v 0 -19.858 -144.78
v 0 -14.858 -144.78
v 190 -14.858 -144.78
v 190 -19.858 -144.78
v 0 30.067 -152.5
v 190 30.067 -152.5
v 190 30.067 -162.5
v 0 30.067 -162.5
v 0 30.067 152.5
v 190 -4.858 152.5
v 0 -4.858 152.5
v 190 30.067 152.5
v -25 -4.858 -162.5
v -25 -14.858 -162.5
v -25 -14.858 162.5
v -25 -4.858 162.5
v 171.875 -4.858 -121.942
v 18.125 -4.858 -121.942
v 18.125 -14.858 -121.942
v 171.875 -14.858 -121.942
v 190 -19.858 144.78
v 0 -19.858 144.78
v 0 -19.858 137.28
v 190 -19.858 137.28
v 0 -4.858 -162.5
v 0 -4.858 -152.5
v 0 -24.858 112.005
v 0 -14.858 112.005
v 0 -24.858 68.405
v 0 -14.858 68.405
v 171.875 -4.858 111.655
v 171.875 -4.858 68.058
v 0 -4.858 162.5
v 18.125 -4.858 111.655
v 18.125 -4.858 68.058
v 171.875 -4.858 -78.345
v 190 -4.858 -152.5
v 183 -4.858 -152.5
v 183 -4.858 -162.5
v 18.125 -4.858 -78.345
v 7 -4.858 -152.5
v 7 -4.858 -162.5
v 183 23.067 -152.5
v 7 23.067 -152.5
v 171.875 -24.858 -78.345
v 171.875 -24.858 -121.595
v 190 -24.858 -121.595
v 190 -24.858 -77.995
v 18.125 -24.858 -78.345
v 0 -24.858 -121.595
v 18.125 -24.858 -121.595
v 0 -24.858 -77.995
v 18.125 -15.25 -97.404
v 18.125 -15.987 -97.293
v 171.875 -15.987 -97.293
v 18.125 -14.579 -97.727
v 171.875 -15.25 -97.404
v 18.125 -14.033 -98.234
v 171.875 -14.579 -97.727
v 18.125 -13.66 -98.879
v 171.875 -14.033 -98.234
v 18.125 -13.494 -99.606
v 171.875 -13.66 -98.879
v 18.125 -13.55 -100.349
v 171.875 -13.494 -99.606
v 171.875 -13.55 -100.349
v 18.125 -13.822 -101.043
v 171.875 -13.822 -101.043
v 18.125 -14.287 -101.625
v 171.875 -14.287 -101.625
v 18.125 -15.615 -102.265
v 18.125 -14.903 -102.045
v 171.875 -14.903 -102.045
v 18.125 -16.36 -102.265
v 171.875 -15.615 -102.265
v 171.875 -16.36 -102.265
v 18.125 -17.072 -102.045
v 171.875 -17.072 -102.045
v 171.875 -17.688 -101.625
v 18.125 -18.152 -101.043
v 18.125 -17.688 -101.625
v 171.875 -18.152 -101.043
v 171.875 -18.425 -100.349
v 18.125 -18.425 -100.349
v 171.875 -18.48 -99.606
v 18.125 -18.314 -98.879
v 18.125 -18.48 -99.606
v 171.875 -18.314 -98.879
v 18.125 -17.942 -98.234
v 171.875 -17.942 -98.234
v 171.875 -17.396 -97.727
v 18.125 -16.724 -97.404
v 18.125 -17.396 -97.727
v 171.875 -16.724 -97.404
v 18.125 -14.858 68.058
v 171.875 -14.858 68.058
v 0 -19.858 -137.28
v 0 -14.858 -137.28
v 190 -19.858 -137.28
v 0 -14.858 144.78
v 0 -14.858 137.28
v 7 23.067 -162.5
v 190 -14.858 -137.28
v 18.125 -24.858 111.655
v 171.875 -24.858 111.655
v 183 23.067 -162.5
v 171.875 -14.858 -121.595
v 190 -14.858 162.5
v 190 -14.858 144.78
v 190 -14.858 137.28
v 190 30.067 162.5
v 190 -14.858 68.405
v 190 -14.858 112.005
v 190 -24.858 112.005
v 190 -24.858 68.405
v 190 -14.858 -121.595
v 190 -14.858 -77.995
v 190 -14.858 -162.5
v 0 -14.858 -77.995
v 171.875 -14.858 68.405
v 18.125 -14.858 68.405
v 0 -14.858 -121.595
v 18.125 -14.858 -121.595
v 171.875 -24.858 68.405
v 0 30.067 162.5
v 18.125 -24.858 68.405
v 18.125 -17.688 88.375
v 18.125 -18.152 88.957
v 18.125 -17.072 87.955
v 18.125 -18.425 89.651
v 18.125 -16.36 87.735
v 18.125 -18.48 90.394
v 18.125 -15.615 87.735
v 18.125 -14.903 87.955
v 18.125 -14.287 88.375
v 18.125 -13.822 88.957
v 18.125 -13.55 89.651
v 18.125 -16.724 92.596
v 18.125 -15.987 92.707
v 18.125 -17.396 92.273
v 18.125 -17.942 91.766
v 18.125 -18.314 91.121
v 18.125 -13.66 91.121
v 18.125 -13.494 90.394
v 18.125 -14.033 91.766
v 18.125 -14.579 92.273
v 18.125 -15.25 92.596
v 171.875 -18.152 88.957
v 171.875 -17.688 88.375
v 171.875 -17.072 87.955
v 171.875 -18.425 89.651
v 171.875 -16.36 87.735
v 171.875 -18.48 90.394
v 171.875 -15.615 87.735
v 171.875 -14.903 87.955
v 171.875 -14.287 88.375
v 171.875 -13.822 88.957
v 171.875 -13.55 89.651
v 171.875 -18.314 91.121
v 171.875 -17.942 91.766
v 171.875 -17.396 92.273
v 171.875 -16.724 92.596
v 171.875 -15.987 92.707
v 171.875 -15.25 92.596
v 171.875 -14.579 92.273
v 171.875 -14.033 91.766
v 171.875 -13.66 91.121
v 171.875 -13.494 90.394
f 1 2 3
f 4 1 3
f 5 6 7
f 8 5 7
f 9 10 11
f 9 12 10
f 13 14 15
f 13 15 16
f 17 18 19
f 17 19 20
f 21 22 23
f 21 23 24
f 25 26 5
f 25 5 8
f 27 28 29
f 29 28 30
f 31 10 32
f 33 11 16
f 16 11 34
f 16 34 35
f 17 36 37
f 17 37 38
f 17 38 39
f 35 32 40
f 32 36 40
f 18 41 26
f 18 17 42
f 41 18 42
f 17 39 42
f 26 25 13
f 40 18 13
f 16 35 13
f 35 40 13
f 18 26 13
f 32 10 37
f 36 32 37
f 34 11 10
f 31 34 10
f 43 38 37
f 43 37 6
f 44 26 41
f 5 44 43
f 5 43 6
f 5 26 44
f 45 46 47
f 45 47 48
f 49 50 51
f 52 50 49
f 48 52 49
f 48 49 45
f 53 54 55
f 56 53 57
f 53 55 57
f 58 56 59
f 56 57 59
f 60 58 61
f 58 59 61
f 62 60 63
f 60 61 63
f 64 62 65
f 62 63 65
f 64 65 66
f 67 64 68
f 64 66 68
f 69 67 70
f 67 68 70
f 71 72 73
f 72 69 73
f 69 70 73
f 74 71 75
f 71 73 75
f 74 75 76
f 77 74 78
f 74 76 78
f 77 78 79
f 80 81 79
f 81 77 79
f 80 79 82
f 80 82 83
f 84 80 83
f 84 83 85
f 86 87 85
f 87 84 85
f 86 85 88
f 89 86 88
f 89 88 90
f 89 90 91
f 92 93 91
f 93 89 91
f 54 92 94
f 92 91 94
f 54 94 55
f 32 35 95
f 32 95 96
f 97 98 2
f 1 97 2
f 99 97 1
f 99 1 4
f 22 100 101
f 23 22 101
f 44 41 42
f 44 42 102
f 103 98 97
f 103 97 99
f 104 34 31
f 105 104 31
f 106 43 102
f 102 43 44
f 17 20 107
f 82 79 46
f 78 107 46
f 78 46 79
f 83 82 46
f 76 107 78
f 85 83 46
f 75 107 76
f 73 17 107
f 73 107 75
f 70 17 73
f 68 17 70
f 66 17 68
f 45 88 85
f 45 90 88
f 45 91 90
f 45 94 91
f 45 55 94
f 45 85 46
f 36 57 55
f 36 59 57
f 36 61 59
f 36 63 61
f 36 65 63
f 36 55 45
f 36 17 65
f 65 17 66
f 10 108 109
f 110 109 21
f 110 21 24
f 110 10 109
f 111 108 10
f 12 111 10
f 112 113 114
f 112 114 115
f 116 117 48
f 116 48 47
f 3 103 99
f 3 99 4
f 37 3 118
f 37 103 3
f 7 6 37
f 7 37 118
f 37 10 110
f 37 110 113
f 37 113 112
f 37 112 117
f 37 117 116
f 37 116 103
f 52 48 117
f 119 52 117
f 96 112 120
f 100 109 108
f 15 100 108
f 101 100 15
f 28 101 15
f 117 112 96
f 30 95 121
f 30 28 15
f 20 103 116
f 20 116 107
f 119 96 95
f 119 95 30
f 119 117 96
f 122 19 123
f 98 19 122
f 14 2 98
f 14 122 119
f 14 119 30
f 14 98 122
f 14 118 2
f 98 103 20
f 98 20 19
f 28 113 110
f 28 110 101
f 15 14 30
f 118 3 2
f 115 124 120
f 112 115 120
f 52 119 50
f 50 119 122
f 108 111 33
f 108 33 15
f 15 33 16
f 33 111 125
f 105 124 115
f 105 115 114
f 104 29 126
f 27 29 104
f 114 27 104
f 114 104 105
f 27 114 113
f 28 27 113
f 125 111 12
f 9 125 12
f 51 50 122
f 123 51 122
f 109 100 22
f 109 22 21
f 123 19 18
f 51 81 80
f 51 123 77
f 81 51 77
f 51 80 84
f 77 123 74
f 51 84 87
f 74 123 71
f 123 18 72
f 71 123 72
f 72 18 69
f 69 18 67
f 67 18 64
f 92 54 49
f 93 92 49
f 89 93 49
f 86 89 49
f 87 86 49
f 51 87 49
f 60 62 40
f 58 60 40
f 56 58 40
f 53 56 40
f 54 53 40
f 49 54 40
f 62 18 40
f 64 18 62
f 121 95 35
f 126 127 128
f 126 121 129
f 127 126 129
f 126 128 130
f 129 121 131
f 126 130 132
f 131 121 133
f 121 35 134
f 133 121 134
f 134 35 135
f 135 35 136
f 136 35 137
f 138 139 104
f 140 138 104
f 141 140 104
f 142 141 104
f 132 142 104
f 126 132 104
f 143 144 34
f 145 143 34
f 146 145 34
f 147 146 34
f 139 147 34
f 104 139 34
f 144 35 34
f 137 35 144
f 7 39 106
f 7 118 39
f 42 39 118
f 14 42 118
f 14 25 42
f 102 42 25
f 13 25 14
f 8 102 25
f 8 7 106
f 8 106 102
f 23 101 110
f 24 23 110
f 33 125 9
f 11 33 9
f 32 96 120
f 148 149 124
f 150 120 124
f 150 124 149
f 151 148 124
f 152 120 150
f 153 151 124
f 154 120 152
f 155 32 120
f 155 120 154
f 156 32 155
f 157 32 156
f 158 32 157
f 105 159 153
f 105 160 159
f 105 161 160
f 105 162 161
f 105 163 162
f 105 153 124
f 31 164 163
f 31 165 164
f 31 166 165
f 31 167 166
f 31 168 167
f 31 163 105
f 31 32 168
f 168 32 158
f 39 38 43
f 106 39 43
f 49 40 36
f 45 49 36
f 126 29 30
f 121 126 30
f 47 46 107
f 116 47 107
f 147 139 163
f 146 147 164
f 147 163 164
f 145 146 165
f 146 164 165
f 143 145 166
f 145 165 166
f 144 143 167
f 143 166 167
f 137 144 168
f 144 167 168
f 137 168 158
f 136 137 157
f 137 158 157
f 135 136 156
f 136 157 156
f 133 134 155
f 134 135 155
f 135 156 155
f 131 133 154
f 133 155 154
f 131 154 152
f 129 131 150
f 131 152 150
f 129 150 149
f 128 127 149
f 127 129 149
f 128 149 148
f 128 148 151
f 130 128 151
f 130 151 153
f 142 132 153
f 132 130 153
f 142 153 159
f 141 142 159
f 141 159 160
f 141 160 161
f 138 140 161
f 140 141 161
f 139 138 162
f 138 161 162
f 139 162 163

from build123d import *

# Parameters (mm, degrees)
SKETCH1_W           = 325
SKETCH1_H           = 10
SKETCH1_W_2         = 10
SKETCH1_H_2         = 34.925125471
BOSS_EXTRUDE1_DEPTH = 190
SKETCH2_W           = 190
SKETCH2_H           = 7.5
BOSS_EXTRUDE2_DEPTH = 5
SKETCH6_W           = 43.6
SKETCH6_H           = 10
BOSS_EXTRUDE4_DEPTH = 190
CUT_EXTRUDE1_START  = -45.92512547
SKETCH3_W           = 153.75
SKETCH3_H           = 43.596922071
CUT_EXTRUDE1_DEPTH  = 56.92512547
SKETCH4_R           = 2.5
BOSS_EXTRUDE3_DEPTH = 171.875
LPATTERN1_COUNT     = 2
LPATTERN1_PITCH     = 190
SKETCH7_W           = 176
SKETCH7_H           = 27.925125471
CUT_EXTRUDE5_DEPTH  = 315
SKETCH8_W           = 25
SKETCH8_H           = 10
BOSS_EXTRUDE6_DEPTH = 325


with BuildPart() as part:
    # Sketch1 → Boss-Extrude1 (new body)
    with BuildSketch(Plane(origin=(0, 0, 0), x_dir=(0, 0, -1), z_dir=(1, 0, 0))):
        with Locations((0, -9.857682562)):
            Rectangle(SKETCH1_W, SKETCH1_H)
        with Locations((-157.5, 12.604880173)):
            Rectangle(SKETCH1_W_2, SKETCH1_H_2)
        with Locations((157.5, 12.604880173)):
            Rectangle(SKETCH1_W_2, SKETCH1_H_2)
    extrude(amount=BOSS_EXTRUDE1_DEPTH)

    # Sketch2 → Boss-Extrude2 (add)
    with BuildSketch(Plane.XZ.offset(14.857682562)):
        with Locations((95, 141.030384385)):
            Rectangle(SKETCH2_W, SKETCH2_H)
        with Locations((95, -141.03)):
            Rectangle(SKETCH2_W, SKETCH2_H)
    extrude(amount=BOSS_EXTRUDE2_DEPTH)

    # Sketch6 → Boss-Extrude4 (add, through all)
    with BuildSketch(Plane.ZY):
        with Locations((90.204898917, -19.857682562)):
            Rectangle(SKETCH6_W, SKETCH6_H)
    boss_extrude4 = extrude(amount=-BOSS_EXTRUDE4_DEPTH)

    # Sketch3 → Cut-Extrude1 (cut)
    with BuildSketch(Plane.XZ.offset(14.857682562).offset(CUT_EXTRUDE1_START)):
        with Locations((95, 89.856251598)):
            Rectangle(SKETCH3_W, SKETCH3_H)
    cut_extrude1 = extrude(amount=CUT_EXTRUDE1_DEPTH, mode=Mode.SUBTRACT)

    # Sketch4 → Boss-Extrude3 (add, through all)
    with BuildSketch(Plane.ZY.offset(-171.875)):
        with Locations((90.207259337, -15.987312382)):
            Circle(SKETCH4_R)
    boss_extrude3 = extrude(amount=BOSS_EXTRUDE3_DEPTH)

    # LPattern1: Boss-Extrude4, Cut-Extrude1, Boss-Extrude3 ×2
    with Locations(*[(0, 0, -i * LPATTERN1_PITCH) for i in range(1, LPATTERN1_COUNT)]):
        add(boss_extrude4)
        add(cut_extrude1, mode=Mode.SUBTRACT)
        add(boss_extrude3)

    # Sketch7 → Cut-Extrude5 (cut)
    with BuildSketch(Plane(origin=(0, 0, 152.5), x_dir=(-1, 0, 0), z_dir=(0, 0, -1))):
        with Locations((-95, 9.104880173)):
            Rectangle(SKETCH7_W, SKETCH7_H)
    extrude(amount=CUT_EXTRUDE5_DEPTH, mode=Mode.SUBTRACT)

    # Sketch8 → Boss-Extrude6 (add)
    with BuildSketch(Plane(origin=(0, 0, -162.5), x_dir=(-1, 0, 0), z_dir=(0, 0, -1))):
        with Locations((12.5, -9.857682562)):
            Rectangle(SKETCH8_W, SKETCH8_H)
    extrude(amount=-BOSS_EXTRUDE6_DEPTH)


solid = part.part
